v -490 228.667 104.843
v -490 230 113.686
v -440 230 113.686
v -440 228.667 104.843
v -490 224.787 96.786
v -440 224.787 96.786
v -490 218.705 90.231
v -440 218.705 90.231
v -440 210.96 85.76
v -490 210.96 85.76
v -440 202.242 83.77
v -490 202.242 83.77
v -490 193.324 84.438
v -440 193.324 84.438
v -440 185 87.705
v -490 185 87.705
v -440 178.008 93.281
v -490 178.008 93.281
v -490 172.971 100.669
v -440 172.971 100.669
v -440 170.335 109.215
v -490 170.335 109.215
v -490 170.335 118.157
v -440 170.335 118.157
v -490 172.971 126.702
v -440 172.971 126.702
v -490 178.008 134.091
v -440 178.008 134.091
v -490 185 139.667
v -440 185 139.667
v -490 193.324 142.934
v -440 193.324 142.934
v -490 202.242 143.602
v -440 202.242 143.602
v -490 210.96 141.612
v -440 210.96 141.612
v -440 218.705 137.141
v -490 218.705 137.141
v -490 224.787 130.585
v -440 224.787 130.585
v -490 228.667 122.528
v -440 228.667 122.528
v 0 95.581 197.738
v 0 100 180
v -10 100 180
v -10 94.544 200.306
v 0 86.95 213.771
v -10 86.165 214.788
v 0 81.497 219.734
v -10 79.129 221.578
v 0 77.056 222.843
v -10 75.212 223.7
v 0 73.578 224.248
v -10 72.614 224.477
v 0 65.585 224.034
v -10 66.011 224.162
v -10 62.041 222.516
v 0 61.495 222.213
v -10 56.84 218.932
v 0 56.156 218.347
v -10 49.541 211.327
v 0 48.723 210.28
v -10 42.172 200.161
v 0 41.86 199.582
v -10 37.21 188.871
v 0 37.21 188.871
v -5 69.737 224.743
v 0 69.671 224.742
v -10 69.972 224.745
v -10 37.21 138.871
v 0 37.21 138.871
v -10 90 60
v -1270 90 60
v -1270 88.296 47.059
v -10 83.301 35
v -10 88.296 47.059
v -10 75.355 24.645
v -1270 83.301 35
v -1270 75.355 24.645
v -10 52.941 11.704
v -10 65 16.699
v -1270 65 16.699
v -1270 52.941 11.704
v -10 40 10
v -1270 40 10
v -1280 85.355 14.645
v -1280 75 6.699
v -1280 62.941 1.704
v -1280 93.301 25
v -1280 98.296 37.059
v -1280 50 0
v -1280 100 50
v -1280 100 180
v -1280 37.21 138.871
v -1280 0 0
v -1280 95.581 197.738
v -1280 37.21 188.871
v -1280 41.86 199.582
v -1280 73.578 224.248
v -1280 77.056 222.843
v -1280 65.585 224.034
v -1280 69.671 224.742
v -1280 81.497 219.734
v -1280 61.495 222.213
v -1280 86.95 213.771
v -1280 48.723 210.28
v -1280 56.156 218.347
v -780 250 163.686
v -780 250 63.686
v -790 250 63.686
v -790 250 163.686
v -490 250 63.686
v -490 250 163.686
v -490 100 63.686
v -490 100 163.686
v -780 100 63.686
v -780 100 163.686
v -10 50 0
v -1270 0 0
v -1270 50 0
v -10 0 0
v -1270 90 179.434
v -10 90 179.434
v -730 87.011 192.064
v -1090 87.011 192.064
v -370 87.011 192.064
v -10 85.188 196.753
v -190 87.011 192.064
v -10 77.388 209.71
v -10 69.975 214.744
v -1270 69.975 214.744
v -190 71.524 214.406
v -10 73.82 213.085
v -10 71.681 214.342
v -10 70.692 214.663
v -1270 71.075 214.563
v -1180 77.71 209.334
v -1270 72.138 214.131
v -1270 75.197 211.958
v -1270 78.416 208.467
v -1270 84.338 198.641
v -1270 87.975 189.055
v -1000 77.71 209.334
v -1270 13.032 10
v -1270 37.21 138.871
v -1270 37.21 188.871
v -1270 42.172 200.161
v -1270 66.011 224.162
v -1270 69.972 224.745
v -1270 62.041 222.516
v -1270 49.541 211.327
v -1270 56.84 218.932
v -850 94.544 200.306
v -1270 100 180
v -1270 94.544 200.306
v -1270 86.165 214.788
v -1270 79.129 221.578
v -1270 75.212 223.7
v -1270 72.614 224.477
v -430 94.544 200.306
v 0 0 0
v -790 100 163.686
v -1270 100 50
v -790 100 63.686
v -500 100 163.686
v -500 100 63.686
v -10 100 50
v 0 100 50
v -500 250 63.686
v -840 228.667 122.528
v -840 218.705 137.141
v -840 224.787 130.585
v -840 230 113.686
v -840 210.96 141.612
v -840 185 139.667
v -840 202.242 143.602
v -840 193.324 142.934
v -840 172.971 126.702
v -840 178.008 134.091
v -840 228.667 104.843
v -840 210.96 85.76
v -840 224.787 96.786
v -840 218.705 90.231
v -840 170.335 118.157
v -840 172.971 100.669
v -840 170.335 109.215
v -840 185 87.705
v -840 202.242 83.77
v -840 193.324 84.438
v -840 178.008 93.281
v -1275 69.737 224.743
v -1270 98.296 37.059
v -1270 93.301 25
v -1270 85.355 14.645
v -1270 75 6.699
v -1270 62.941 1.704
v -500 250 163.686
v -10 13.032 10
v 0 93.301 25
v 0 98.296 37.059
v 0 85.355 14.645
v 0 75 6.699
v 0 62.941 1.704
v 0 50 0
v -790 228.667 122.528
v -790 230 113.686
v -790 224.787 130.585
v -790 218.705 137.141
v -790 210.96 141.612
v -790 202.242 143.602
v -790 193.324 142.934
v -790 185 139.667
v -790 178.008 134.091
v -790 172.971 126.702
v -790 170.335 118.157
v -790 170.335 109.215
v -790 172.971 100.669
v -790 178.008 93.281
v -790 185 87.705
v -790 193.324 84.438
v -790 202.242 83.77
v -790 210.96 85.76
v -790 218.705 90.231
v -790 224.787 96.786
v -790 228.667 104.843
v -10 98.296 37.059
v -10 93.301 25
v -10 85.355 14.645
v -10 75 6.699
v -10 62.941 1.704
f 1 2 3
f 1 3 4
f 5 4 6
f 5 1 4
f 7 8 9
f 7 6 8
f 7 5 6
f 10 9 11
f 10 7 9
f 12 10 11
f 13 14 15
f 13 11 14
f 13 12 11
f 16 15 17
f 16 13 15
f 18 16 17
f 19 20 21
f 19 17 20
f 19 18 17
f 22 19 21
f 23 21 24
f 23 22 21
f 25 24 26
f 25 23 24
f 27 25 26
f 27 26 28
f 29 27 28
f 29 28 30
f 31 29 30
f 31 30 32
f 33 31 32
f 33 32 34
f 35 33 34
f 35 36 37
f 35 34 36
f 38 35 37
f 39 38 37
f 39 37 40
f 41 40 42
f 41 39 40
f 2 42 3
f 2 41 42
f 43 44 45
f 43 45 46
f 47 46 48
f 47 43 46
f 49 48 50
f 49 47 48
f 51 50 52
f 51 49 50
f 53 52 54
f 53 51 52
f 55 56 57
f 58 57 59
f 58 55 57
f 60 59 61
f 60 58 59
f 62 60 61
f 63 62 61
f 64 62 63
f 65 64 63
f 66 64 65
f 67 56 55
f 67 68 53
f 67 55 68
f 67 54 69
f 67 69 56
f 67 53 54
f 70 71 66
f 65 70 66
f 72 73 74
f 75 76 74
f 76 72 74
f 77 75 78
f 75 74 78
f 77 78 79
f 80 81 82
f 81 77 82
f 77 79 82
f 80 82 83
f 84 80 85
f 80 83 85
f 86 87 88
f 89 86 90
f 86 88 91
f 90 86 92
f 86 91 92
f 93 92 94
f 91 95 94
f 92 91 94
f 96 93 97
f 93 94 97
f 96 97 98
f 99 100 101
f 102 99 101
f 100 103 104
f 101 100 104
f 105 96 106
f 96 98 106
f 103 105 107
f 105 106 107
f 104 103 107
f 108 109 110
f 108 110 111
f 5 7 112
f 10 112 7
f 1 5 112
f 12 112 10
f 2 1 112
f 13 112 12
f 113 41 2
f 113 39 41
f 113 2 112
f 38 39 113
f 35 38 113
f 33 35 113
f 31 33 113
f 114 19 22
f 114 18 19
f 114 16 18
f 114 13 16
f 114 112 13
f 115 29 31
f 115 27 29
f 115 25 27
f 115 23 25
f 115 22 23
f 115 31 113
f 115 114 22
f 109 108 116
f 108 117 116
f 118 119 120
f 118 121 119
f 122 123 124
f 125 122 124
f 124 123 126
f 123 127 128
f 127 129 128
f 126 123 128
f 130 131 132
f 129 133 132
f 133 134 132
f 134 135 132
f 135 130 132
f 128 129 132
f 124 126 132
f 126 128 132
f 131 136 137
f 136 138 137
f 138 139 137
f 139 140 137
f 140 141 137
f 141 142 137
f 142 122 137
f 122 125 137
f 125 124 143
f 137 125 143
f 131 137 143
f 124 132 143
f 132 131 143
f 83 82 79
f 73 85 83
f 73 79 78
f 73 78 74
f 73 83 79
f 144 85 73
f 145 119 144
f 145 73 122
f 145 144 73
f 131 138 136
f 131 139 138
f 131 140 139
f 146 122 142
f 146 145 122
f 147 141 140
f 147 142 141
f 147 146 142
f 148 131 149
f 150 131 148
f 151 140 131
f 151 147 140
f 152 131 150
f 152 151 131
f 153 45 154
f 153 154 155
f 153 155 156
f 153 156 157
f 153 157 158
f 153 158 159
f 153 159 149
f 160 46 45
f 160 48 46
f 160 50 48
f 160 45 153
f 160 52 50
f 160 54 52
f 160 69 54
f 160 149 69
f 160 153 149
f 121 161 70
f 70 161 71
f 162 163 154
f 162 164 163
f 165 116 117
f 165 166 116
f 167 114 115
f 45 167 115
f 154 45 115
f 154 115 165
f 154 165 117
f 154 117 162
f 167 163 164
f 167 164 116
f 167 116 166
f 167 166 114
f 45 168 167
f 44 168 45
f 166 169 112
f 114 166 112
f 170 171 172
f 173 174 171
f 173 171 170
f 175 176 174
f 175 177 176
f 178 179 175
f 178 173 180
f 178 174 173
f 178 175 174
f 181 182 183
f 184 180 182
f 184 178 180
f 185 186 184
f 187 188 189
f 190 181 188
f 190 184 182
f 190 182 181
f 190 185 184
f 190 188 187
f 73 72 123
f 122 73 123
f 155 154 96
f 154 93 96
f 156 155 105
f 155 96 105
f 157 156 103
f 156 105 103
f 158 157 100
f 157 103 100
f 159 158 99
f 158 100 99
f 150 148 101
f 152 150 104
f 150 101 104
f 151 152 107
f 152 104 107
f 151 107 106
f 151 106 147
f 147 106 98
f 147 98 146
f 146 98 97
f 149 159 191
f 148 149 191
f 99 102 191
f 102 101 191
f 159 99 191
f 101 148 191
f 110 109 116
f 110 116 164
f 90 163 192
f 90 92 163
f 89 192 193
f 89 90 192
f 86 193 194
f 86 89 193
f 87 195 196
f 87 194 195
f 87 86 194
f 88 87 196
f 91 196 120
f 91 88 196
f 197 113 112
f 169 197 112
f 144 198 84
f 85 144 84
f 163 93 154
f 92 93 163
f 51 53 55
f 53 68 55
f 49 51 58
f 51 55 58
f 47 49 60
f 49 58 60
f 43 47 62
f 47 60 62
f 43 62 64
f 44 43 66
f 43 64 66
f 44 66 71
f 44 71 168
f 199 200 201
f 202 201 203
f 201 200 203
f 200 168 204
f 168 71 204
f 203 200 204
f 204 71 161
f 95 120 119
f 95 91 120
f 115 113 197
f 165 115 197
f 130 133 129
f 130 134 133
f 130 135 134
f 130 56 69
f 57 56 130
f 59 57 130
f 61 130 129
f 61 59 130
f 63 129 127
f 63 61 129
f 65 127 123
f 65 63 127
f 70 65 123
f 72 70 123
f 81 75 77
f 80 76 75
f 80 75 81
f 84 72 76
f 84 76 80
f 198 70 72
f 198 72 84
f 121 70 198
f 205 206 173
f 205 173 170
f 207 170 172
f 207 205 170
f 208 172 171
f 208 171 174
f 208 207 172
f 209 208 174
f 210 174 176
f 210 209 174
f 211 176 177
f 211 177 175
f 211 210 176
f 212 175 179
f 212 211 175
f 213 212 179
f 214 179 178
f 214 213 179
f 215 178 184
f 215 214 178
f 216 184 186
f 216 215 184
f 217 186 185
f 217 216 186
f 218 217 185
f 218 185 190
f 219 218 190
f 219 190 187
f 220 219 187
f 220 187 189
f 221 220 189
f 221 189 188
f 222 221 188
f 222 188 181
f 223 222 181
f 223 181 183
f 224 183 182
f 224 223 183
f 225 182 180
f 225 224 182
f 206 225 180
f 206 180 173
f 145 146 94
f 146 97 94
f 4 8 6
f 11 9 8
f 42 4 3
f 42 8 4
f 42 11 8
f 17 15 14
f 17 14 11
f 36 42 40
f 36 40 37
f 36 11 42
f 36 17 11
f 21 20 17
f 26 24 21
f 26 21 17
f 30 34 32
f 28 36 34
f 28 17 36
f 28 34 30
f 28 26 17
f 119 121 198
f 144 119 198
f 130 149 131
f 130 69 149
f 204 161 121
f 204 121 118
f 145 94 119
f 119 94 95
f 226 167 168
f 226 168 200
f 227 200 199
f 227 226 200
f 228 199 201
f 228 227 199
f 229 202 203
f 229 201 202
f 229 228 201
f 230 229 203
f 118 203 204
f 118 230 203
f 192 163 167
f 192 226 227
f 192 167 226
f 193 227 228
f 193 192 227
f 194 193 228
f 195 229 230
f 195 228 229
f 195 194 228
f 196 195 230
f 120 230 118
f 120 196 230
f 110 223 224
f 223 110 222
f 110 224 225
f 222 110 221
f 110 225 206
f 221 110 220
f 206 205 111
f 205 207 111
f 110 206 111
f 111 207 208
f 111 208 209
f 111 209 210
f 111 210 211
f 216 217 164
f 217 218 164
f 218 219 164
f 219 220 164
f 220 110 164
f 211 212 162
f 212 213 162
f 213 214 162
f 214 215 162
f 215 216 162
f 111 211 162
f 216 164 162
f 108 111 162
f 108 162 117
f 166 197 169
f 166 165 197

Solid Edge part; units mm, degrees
sketch "Sketch1" plane through (0, 0, 0) normal (1, 0, 0) x (0, 1, 0)
  line L0 (37.2104, 138.8713) -> (37.2104, 188.8713)
  spline S0 degree 3 poles (100, 180) (97.8773, 199.692) (72.5701, 247.7114) (42.0437, 203.6951) (37.2104, 188.8713) knots 0 0 0 0 0.527303 1 1 1 1
  line L1 (100, 0) -> (100, 180)
  line L2 (0, 0) -> (100, 0)
  line L3 (0, 0) -> (37.2104, 138.8713)
extrude "Protrusion1" add sketch "Sketch1" against normal blind 10
mirror "Mirror1" about plane through (-640, 0, 0) normal (1, 0, 0) of "Protrusion1"
sketch "Sketch2" plane through (-10, 50, 112.439) normal (-1, 0, 0) x (0, -1, 0)
  line L0 (-50, -112.439) -> (-50, 67.561)
  spline S0 degree 3 poles (-50, 67.561) (-47.8885, 87.149) (-34.6735, 112.3063) (-19.9715, 112.3063) knots 0 0 0 0 1 1 1 1
  line L1 (-19.9715, 112.3063) -> (-19.975, 102.3046)
  spline S1 degree 3 poles (-40, 66.9953) (-39.5373, 70.9153) (-38.5008, 75.3255) (-35.4559, 84.1103) (-33.4066, 88.4861) (-29.9959, 93.9577) (-28.8084, 95.6011) (-26.4539, 98.375) (-25.2871, 99.5054) (-23.1744, 101.1643) (-22.2404, 101.6859) (-21.1658, 102.1077) (-20.8601, 102.1932) (-20.3629, 102.2886) (-20.1637, 102.3046) (-19.975, 102.3046) knots 0 0 0 0 0.243507 0.243507 0.497563 0.497563 0.62459 0.62459 0.751618 0.751618 0.878646 0.878646 0.94216 0.94216 1 1 1 1
  line L2 (-40, -102.439) -> (-40, 66.9953)
  line L3 (36.9677, -102.439) -> (-40, -102.439)
  line L4 (50, -112.439) -> (36.9677, -102.439)
  line L5 (50, -112.439) -> (-50, -112.439)
  dimension "D1" = 10
extrude "Protrusion3" add sketch "Sketch2" along normal up to next
fillet "Round_1" radius 50 1 edges at (-640, 90, 10)
fillet "Round_2" radius 50 1 edges at (-640, 100, 0)
sketch "Sketch3" plane through (-540, 100, 115) normal (0, 1, 0) x (-1, 0, 0)
  line L0 (-50, 48.6858) -> (-40, 48.6858)
  line L1 (-40, 48.6858) -> (-40, -51.3142)
  line L2 (-40, -51.3142) -> (-50, -51.3142)
  line L3 (-50, -51.3142) -> (-50, 48.6858)
  line L4 (250, 48.6858) -> (240, 48.6858)
  line L5 (240, 48.6858) -> (240, -51.3142)
  line L6 (240, -51.3142) -> (250, -51.3142)
  line L7 (250, -51.3142) -> (250, 48.6858)
  dimension "D1" = 300
  dimension "D2" = 100
  dimension "D3" = 10
  dimension "D4" = 10
extrude "Protrusion4" add sketch "Sketch3" along normal blind 150
extrude "Cutout1" [suppressed]
sketch "Sketch4" plane through (-490, 175, 113.6858) normal (1, 0, 0) x (0, 1, 0)
  circle A0 centre (25, 0) radius 30
  dimension "D1" = 60
  dimension "D2" = 50
  dimension "D3" = 50
extrude "ExtrudedProtrusion_5" add sketch "Sketch4" along normal blind 50
mirror "Mirror2" about plane through (-640, 175, 113.6858) normal (-1, 0, 0) of "ExtrudedProtrusion_5"
